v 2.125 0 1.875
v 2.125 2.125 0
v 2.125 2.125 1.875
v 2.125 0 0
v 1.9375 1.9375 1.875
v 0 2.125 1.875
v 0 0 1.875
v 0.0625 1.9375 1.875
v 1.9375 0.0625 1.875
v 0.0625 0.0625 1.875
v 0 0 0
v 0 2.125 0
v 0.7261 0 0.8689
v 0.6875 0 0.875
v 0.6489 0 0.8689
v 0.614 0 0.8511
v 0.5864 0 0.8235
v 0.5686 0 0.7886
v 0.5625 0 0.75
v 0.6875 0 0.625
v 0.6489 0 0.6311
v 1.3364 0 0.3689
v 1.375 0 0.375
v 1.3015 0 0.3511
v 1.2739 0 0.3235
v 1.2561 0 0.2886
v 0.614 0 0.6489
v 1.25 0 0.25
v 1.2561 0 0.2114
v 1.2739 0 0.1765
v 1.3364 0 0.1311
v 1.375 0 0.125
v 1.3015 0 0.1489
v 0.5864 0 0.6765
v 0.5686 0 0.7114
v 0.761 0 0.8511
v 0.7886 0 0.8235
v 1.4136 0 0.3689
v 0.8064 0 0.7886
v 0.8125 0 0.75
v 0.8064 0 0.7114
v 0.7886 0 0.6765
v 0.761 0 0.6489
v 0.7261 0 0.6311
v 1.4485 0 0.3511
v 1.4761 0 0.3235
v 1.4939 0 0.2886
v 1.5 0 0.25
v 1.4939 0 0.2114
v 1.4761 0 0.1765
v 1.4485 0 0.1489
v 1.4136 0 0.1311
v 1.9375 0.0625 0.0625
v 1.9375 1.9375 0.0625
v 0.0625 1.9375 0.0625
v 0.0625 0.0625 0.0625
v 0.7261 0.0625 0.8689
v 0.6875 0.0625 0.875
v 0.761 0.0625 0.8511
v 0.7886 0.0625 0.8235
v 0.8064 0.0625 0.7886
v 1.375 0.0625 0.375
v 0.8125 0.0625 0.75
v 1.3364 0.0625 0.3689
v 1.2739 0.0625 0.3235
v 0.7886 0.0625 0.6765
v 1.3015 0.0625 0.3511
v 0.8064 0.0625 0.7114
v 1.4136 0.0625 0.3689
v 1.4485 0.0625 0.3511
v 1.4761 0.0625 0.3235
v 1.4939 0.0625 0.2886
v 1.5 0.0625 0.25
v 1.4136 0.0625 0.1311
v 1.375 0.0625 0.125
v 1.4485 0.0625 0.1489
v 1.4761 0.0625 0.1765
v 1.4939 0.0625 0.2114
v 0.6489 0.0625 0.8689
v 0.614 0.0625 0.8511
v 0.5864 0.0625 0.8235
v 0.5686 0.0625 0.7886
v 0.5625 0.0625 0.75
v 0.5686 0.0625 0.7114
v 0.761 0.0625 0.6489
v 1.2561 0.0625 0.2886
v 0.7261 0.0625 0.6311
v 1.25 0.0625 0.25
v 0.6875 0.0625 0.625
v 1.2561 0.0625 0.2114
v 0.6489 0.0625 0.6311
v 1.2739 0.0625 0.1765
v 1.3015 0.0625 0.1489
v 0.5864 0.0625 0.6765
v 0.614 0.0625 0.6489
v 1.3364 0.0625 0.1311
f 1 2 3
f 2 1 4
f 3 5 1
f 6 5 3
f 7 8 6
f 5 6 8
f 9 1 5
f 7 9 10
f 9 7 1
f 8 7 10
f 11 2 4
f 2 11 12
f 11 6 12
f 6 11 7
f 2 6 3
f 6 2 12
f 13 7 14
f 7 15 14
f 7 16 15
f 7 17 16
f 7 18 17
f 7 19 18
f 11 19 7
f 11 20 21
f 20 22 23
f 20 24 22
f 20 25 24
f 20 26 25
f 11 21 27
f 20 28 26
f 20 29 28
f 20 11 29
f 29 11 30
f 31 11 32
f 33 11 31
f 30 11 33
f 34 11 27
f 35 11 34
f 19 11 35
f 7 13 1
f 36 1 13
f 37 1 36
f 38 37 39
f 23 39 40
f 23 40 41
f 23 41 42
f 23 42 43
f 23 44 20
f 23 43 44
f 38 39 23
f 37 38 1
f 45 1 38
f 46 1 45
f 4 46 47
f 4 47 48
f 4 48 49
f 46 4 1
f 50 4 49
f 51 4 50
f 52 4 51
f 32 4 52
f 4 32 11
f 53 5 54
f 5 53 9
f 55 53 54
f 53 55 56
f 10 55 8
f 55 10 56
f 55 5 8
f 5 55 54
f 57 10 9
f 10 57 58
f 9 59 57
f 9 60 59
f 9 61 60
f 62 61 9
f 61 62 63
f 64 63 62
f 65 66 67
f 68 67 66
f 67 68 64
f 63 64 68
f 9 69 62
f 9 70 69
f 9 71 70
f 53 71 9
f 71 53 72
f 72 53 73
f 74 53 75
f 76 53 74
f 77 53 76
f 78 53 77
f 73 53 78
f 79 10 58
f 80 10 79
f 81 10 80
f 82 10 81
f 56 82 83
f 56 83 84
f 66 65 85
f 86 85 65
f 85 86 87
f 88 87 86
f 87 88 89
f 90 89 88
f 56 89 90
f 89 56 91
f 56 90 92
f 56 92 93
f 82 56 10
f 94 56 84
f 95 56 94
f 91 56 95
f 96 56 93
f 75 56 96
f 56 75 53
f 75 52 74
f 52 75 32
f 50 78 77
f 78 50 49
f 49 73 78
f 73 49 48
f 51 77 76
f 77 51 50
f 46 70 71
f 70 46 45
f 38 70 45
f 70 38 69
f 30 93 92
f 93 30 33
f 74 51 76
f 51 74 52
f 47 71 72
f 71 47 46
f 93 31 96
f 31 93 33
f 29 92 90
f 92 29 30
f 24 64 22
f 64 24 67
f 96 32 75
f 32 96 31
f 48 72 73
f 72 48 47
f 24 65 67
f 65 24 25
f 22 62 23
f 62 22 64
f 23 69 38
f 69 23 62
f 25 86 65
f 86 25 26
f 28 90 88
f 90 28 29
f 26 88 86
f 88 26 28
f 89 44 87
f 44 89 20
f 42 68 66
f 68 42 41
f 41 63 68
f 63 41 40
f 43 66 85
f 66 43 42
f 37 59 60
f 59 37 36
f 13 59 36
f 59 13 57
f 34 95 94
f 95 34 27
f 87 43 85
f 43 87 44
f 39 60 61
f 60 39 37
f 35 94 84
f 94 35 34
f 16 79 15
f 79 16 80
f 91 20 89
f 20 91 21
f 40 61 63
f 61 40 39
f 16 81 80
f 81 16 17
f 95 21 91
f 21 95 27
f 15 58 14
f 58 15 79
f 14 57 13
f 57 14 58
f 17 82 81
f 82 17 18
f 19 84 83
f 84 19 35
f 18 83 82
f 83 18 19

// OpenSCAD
thickness = 1/8;
difference() {
    difference() {
        difference() {
            cube([2+(thickness),2+(thickness),1.75+thickness]);
            translate([1/16,1/16,1/16]) cube([2-thickness,2-thickness,2-thickness]);
        }
        translate([1+(1/4)+ thickness, 0, 1/4]) rotate([-90,0,0]) cylinder(1/8,1/8,thickness,$fn=20);
    }
    translate([9/16+thickness,0,5/8+thickness]) rotate([-90,0,0]) cylinder(1/8,1/8,thickness,$fn=20);
}
